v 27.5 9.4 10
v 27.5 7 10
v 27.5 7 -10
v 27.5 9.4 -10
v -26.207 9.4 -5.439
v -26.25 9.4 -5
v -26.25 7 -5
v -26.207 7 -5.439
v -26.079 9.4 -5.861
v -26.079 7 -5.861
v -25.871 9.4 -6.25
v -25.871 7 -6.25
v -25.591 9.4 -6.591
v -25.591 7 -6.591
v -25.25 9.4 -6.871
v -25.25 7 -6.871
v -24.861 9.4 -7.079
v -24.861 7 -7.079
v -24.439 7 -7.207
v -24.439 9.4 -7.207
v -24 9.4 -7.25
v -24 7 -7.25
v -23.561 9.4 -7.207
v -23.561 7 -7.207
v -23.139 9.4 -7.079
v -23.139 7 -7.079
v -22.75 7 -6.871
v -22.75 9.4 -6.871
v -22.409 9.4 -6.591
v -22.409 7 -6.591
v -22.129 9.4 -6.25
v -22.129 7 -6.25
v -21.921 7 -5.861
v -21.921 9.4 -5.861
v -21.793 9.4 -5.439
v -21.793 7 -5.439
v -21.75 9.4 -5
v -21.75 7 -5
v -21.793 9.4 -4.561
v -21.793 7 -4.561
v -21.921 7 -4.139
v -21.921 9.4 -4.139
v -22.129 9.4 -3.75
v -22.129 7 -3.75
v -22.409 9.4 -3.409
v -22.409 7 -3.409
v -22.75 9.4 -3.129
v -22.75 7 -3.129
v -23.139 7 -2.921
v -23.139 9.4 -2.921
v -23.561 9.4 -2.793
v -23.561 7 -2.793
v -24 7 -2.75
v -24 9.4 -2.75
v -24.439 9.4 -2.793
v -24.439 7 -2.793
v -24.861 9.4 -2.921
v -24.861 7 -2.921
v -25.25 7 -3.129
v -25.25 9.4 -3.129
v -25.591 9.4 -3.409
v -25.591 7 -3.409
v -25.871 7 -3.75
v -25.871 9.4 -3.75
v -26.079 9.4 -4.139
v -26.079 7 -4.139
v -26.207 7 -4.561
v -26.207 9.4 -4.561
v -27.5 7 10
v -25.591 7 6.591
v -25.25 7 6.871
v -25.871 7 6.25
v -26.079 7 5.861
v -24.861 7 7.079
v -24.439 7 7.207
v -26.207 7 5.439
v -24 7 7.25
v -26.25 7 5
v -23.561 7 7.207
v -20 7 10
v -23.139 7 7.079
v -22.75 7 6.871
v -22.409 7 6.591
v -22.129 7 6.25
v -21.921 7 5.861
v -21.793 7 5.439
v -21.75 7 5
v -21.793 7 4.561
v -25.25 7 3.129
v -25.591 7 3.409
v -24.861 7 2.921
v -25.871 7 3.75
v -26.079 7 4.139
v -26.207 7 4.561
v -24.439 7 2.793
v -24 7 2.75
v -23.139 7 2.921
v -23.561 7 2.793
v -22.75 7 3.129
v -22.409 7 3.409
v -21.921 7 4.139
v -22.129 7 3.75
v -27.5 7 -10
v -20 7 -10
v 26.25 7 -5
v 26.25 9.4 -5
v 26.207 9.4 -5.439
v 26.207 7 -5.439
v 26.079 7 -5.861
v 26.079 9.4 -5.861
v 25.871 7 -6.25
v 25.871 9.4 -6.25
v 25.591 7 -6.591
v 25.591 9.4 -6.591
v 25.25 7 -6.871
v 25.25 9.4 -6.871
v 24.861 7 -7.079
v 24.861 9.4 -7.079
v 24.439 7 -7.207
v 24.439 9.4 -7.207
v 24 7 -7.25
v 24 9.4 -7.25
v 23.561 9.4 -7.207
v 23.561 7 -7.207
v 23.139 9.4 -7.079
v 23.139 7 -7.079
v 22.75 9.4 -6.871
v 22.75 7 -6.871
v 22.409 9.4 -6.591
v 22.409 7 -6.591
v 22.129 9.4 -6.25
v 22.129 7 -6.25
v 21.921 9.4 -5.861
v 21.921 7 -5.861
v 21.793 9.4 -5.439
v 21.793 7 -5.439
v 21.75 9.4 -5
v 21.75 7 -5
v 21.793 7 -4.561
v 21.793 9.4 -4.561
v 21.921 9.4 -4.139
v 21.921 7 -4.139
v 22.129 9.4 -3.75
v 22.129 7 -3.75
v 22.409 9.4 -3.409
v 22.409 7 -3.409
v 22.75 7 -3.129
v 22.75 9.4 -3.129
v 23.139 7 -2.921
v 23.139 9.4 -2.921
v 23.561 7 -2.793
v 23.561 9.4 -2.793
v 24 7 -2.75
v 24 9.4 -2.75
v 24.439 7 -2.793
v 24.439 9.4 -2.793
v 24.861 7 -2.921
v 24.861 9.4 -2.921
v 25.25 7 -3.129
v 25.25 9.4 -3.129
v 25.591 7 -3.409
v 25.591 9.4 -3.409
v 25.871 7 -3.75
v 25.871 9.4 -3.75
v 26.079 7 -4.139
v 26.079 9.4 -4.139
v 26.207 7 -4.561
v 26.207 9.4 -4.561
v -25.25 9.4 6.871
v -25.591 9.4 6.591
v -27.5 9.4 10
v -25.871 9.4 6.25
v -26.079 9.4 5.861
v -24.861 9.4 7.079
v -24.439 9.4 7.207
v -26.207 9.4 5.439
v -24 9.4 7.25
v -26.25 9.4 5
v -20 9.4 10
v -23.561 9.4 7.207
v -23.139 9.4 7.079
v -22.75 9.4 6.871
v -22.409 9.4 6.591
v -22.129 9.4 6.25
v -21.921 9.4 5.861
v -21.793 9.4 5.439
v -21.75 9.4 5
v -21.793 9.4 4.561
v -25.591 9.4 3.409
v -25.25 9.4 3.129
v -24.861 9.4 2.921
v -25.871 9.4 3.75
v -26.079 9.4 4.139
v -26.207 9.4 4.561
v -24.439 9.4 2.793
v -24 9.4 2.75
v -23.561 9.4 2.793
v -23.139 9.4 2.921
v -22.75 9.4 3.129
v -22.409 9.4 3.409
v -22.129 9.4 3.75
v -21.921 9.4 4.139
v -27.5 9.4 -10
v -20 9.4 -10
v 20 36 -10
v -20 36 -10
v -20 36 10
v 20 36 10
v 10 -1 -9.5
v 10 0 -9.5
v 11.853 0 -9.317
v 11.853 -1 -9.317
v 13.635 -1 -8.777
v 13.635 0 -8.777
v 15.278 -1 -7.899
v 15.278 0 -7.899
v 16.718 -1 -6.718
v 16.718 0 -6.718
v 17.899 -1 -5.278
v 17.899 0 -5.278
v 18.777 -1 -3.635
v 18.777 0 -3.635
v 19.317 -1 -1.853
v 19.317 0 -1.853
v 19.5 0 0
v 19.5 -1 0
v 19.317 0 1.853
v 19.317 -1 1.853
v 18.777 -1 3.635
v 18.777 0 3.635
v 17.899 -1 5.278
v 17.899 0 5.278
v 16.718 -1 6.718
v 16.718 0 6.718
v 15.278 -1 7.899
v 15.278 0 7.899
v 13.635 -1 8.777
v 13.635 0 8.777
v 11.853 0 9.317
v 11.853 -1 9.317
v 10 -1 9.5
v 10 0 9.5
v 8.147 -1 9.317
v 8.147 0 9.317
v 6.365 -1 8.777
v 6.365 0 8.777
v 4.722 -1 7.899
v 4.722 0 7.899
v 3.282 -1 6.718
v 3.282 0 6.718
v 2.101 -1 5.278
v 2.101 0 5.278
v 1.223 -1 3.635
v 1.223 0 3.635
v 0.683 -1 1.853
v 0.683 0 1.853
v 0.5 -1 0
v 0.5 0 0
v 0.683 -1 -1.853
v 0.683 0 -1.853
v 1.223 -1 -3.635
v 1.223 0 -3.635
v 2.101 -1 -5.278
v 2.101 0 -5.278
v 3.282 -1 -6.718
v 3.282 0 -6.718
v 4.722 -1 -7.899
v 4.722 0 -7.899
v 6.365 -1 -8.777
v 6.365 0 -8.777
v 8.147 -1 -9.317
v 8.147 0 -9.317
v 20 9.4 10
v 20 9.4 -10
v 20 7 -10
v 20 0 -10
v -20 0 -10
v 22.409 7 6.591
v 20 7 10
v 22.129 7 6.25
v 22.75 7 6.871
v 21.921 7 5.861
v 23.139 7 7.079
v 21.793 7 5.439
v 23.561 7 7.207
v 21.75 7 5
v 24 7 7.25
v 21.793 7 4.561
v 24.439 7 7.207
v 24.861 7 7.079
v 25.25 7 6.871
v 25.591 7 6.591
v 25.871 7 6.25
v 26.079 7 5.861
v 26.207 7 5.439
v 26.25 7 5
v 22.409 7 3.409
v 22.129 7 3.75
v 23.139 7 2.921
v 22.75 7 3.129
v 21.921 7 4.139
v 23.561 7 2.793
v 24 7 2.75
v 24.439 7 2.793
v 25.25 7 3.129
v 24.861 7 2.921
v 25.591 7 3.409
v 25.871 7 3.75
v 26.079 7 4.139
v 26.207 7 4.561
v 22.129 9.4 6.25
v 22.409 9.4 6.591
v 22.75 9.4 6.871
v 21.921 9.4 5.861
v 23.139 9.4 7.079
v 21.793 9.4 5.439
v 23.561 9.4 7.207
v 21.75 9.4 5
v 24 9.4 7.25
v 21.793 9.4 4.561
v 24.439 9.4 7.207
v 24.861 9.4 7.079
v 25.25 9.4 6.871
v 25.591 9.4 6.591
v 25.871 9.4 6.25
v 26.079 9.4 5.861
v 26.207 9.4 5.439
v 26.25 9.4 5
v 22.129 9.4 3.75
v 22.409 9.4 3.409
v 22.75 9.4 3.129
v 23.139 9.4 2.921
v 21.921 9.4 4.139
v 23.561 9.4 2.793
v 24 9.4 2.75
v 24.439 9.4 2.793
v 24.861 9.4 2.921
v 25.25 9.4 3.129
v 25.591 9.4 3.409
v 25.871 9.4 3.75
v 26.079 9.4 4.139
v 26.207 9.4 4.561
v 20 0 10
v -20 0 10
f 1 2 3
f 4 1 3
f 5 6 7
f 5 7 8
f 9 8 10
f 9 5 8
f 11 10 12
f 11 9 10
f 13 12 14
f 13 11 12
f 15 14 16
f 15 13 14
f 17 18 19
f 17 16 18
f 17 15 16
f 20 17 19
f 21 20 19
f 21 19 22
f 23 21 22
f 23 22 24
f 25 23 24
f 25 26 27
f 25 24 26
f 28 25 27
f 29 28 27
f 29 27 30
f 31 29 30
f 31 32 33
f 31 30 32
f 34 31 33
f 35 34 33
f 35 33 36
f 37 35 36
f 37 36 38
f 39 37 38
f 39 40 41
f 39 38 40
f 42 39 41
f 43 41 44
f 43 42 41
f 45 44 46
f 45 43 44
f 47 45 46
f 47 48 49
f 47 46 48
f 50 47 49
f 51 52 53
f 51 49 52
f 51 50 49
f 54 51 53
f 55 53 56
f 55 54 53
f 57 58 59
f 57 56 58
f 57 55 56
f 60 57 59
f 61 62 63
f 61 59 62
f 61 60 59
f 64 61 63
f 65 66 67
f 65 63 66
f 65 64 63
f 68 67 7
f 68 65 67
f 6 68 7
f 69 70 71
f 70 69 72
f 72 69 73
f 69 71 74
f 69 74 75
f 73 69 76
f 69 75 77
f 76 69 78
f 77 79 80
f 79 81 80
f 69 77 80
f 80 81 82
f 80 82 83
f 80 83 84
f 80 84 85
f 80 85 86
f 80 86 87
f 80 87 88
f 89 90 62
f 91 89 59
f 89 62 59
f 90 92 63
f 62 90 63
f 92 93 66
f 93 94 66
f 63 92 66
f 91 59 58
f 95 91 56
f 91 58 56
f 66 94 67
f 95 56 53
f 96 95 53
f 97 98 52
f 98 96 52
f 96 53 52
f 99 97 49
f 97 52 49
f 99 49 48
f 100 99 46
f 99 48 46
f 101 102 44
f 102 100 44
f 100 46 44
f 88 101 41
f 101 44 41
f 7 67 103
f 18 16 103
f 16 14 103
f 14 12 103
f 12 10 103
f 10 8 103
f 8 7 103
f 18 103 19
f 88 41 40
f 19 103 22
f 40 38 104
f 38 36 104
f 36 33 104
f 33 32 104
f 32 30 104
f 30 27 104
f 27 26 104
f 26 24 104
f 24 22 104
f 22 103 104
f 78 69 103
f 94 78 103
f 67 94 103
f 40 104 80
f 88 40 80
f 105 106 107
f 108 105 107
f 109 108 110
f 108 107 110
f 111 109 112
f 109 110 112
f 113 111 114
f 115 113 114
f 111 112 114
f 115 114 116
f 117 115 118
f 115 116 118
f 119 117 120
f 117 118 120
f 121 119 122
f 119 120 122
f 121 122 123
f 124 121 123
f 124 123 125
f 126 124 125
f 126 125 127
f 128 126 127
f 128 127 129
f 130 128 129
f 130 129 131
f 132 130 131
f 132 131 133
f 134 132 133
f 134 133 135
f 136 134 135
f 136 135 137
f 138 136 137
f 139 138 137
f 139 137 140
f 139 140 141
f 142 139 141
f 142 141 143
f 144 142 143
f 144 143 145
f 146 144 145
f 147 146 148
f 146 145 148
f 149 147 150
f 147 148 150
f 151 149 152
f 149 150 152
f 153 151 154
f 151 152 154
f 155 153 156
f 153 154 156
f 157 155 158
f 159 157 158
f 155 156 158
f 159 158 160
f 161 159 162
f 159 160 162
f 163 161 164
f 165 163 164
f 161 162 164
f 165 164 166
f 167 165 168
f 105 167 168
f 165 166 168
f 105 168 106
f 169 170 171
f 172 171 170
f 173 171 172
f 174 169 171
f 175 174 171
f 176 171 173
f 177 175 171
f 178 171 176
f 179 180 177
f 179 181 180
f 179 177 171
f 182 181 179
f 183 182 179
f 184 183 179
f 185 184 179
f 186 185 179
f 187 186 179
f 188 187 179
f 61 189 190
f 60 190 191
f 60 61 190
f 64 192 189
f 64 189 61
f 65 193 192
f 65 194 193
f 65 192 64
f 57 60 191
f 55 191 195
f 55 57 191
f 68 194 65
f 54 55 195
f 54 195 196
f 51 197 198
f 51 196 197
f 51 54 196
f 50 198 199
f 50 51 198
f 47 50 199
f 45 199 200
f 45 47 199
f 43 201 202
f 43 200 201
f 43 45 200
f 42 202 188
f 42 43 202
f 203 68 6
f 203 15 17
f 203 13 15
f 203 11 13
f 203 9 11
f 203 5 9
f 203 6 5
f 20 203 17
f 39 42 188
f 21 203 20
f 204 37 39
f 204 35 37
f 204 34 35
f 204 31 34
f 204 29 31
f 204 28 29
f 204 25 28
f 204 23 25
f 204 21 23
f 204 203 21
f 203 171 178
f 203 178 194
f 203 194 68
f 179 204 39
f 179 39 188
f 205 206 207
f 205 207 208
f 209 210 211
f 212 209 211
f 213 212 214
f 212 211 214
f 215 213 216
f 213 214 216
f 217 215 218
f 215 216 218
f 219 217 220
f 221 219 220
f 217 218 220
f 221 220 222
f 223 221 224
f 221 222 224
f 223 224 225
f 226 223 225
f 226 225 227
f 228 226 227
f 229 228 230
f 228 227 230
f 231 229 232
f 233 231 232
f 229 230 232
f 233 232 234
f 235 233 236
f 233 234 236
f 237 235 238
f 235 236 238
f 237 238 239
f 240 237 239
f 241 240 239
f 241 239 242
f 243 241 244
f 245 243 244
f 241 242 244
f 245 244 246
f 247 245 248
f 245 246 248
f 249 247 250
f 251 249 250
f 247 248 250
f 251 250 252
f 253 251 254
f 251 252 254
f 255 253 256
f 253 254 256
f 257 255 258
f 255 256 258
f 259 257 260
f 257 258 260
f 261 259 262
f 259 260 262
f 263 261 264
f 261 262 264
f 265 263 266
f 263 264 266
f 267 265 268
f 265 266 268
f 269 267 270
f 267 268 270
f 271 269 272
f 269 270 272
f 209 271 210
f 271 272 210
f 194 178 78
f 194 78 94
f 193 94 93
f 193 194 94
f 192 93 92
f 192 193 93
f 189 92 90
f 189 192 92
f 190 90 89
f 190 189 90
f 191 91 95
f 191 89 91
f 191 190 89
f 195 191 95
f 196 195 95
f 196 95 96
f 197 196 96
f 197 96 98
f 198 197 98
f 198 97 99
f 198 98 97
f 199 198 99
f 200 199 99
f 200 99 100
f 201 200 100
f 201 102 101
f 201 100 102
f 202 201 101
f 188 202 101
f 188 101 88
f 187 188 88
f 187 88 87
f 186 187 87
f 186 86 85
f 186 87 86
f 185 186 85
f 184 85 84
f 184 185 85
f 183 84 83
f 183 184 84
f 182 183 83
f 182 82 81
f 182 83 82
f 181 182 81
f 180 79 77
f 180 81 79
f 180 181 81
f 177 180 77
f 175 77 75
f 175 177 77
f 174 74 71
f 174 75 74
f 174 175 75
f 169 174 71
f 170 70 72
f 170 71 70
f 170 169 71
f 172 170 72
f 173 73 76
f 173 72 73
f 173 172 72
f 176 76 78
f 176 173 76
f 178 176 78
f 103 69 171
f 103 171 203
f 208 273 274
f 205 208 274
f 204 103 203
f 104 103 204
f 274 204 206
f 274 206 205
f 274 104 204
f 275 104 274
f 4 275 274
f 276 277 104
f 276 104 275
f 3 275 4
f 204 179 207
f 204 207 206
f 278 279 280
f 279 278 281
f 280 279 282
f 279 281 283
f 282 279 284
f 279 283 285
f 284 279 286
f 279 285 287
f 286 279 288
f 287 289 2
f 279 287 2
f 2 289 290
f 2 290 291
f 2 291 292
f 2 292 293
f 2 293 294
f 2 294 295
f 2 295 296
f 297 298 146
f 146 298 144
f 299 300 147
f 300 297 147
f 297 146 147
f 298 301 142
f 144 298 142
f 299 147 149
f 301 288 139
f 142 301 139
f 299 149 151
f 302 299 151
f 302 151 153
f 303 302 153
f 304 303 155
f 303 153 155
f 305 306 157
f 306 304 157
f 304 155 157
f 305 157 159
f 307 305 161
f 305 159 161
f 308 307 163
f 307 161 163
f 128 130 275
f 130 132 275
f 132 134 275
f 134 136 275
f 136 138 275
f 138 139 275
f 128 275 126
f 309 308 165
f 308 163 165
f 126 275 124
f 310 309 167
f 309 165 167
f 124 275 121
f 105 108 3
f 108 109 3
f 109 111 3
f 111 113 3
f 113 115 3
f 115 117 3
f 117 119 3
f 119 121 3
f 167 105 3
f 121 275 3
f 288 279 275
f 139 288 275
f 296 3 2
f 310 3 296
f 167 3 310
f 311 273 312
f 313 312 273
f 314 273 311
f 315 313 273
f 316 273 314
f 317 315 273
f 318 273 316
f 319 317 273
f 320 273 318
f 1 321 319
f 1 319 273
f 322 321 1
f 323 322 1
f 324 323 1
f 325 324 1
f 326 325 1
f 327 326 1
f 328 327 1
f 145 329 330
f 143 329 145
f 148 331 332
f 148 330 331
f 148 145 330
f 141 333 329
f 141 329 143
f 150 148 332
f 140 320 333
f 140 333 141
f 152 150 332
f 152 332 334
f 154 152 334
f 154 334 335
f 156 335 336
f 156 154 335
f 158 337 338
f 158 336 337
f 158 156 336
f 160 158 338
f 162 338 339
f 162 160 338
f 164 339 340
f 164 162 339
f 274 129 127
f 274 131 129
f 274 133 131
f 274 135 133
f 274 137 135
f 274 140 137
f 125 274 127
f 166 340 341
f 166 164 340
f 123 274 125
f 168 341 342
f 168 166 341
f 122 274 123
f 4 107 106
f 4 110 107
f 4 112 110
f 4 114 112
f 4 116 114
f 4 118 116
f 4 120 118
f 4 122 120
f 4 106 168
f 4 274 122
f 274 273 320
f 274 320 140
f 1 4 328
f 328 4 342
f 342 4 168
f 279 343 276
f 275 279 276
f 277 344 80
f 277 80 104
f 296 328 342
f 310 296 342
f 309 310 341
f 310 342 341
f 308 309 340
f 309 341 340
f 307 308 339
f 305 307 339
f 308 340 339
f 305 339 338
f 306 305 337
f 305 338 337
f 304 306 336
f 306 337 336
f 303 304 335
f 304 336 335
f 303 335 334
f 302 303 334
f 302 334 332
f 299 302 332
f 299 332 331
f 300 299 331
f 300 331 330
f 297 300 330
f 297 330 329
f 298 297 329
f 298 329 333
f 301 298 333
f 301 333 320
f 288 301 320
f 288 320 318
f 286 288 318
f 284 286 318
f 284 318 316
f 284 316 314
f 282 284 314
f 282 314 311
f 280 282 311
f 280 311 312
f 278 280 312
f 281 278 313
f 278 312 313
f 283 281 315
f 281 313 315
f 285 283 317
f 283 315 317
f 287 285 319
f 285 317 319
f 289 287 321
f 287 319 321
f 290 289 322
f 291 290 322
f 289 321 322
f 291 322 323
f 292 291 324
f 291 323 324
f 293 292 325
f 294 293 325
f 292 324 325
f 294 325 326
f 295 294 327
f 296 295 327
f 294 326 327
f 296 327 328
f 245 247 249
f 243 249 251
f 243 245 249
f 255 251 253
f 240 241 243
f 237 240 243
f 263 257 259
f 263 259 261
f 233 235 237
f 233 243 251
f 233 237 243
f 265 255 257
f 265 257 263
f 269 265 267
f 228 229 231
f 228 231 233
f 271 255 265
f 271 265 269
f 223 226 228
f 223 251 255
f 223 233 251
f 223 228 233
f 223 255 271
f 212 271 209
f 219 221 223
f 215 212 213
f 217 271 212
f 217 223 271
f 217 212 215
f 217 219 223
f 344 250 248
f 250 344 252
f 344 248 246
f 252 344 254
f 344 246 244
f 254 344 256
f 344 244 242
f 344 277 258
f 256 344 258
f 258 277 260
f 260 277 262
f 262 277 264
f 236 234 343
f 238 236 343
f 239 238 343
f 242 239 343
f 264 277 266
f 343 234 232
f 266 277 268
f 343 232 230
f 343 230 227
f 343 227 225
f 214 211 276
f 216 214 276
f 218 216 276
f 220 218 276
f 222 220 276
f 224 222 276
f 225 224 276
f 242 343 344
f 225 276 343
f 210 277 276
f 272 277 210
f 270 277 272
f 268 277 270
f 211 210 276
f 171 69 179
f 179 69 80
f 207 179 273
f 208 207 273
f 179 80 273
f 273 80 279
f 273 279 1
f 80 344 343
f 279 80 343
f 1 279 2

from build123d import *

# Parameters (mm, degrees)
SKETCH1_W            = 40
SKETCH1_H            = 20
BOSS_EXTRUDE1_DEPTH  = 36
SKETCH2_W            = 55
SKETCH2_H            = 20
BOSS_EXTRUDE2_DEPTH  = 2.4
M4_CLEARANCE_HOLE1_D = 4.5
SKETCH5_R            = 9.5
BOSS_EXTRUDE3_DEPTH  = 1


with BuildPart() as part:
    # Sketch1 → Boss-Extrude1 (new body)
    with BuildSketch(Plane(origin=(0, 0, 0), x_dir=(1, 0, 0), z_dir=(0, 1, 0))):
        Rectangle(SKETCH1_W, SKETCH1_H)
    extrude(amount=BOSS_EXTRUDE1_DEPTH)

    # Sketch2 → Boss-Extrude2 (add)
    with BuildSketch(Plane(origin=(0, 7, 0), x_dir=(1, 0, 0), z_dir=(0, 1, 0))):
        Rectangle(SKETCH2_W, SKETCH2_H)
    extrude(amount=BOSS_EXTRUDE2_DEPTH)

    # M4 Clearance Hole1 (through all)
    with Locations(Plane(origin=(0, 7, 0), x_dir=(-1, 0, 0), z_dir=(0, -1, 0))):
        with Locations((-24, 5), (-24, -5)):
            m4_clearance_hole1 = Hole(M4_CLEARANCE_HOLE1_D / 2)

    # Mirror1: M4 Clearance Hole1 across plane
    add(m4_clearance_hole1.mirror(Plane(origin=(0, 0, 0), x_dir=(0, 0, 1), z_dir=(1, 0, 0))), mode=Mode.SUBTRACT)

    # Sketch5 → Boss-Extrude3 (add)
    with BuildSketch(Plane.XZ):
        with Locations(Location((10, 0, 0), (0, 0, 270))):
            Circle(SKETCH5_R)
    extrude(amount=BOSS_EXTRUDE3_DEPTH)


solid = part.part
